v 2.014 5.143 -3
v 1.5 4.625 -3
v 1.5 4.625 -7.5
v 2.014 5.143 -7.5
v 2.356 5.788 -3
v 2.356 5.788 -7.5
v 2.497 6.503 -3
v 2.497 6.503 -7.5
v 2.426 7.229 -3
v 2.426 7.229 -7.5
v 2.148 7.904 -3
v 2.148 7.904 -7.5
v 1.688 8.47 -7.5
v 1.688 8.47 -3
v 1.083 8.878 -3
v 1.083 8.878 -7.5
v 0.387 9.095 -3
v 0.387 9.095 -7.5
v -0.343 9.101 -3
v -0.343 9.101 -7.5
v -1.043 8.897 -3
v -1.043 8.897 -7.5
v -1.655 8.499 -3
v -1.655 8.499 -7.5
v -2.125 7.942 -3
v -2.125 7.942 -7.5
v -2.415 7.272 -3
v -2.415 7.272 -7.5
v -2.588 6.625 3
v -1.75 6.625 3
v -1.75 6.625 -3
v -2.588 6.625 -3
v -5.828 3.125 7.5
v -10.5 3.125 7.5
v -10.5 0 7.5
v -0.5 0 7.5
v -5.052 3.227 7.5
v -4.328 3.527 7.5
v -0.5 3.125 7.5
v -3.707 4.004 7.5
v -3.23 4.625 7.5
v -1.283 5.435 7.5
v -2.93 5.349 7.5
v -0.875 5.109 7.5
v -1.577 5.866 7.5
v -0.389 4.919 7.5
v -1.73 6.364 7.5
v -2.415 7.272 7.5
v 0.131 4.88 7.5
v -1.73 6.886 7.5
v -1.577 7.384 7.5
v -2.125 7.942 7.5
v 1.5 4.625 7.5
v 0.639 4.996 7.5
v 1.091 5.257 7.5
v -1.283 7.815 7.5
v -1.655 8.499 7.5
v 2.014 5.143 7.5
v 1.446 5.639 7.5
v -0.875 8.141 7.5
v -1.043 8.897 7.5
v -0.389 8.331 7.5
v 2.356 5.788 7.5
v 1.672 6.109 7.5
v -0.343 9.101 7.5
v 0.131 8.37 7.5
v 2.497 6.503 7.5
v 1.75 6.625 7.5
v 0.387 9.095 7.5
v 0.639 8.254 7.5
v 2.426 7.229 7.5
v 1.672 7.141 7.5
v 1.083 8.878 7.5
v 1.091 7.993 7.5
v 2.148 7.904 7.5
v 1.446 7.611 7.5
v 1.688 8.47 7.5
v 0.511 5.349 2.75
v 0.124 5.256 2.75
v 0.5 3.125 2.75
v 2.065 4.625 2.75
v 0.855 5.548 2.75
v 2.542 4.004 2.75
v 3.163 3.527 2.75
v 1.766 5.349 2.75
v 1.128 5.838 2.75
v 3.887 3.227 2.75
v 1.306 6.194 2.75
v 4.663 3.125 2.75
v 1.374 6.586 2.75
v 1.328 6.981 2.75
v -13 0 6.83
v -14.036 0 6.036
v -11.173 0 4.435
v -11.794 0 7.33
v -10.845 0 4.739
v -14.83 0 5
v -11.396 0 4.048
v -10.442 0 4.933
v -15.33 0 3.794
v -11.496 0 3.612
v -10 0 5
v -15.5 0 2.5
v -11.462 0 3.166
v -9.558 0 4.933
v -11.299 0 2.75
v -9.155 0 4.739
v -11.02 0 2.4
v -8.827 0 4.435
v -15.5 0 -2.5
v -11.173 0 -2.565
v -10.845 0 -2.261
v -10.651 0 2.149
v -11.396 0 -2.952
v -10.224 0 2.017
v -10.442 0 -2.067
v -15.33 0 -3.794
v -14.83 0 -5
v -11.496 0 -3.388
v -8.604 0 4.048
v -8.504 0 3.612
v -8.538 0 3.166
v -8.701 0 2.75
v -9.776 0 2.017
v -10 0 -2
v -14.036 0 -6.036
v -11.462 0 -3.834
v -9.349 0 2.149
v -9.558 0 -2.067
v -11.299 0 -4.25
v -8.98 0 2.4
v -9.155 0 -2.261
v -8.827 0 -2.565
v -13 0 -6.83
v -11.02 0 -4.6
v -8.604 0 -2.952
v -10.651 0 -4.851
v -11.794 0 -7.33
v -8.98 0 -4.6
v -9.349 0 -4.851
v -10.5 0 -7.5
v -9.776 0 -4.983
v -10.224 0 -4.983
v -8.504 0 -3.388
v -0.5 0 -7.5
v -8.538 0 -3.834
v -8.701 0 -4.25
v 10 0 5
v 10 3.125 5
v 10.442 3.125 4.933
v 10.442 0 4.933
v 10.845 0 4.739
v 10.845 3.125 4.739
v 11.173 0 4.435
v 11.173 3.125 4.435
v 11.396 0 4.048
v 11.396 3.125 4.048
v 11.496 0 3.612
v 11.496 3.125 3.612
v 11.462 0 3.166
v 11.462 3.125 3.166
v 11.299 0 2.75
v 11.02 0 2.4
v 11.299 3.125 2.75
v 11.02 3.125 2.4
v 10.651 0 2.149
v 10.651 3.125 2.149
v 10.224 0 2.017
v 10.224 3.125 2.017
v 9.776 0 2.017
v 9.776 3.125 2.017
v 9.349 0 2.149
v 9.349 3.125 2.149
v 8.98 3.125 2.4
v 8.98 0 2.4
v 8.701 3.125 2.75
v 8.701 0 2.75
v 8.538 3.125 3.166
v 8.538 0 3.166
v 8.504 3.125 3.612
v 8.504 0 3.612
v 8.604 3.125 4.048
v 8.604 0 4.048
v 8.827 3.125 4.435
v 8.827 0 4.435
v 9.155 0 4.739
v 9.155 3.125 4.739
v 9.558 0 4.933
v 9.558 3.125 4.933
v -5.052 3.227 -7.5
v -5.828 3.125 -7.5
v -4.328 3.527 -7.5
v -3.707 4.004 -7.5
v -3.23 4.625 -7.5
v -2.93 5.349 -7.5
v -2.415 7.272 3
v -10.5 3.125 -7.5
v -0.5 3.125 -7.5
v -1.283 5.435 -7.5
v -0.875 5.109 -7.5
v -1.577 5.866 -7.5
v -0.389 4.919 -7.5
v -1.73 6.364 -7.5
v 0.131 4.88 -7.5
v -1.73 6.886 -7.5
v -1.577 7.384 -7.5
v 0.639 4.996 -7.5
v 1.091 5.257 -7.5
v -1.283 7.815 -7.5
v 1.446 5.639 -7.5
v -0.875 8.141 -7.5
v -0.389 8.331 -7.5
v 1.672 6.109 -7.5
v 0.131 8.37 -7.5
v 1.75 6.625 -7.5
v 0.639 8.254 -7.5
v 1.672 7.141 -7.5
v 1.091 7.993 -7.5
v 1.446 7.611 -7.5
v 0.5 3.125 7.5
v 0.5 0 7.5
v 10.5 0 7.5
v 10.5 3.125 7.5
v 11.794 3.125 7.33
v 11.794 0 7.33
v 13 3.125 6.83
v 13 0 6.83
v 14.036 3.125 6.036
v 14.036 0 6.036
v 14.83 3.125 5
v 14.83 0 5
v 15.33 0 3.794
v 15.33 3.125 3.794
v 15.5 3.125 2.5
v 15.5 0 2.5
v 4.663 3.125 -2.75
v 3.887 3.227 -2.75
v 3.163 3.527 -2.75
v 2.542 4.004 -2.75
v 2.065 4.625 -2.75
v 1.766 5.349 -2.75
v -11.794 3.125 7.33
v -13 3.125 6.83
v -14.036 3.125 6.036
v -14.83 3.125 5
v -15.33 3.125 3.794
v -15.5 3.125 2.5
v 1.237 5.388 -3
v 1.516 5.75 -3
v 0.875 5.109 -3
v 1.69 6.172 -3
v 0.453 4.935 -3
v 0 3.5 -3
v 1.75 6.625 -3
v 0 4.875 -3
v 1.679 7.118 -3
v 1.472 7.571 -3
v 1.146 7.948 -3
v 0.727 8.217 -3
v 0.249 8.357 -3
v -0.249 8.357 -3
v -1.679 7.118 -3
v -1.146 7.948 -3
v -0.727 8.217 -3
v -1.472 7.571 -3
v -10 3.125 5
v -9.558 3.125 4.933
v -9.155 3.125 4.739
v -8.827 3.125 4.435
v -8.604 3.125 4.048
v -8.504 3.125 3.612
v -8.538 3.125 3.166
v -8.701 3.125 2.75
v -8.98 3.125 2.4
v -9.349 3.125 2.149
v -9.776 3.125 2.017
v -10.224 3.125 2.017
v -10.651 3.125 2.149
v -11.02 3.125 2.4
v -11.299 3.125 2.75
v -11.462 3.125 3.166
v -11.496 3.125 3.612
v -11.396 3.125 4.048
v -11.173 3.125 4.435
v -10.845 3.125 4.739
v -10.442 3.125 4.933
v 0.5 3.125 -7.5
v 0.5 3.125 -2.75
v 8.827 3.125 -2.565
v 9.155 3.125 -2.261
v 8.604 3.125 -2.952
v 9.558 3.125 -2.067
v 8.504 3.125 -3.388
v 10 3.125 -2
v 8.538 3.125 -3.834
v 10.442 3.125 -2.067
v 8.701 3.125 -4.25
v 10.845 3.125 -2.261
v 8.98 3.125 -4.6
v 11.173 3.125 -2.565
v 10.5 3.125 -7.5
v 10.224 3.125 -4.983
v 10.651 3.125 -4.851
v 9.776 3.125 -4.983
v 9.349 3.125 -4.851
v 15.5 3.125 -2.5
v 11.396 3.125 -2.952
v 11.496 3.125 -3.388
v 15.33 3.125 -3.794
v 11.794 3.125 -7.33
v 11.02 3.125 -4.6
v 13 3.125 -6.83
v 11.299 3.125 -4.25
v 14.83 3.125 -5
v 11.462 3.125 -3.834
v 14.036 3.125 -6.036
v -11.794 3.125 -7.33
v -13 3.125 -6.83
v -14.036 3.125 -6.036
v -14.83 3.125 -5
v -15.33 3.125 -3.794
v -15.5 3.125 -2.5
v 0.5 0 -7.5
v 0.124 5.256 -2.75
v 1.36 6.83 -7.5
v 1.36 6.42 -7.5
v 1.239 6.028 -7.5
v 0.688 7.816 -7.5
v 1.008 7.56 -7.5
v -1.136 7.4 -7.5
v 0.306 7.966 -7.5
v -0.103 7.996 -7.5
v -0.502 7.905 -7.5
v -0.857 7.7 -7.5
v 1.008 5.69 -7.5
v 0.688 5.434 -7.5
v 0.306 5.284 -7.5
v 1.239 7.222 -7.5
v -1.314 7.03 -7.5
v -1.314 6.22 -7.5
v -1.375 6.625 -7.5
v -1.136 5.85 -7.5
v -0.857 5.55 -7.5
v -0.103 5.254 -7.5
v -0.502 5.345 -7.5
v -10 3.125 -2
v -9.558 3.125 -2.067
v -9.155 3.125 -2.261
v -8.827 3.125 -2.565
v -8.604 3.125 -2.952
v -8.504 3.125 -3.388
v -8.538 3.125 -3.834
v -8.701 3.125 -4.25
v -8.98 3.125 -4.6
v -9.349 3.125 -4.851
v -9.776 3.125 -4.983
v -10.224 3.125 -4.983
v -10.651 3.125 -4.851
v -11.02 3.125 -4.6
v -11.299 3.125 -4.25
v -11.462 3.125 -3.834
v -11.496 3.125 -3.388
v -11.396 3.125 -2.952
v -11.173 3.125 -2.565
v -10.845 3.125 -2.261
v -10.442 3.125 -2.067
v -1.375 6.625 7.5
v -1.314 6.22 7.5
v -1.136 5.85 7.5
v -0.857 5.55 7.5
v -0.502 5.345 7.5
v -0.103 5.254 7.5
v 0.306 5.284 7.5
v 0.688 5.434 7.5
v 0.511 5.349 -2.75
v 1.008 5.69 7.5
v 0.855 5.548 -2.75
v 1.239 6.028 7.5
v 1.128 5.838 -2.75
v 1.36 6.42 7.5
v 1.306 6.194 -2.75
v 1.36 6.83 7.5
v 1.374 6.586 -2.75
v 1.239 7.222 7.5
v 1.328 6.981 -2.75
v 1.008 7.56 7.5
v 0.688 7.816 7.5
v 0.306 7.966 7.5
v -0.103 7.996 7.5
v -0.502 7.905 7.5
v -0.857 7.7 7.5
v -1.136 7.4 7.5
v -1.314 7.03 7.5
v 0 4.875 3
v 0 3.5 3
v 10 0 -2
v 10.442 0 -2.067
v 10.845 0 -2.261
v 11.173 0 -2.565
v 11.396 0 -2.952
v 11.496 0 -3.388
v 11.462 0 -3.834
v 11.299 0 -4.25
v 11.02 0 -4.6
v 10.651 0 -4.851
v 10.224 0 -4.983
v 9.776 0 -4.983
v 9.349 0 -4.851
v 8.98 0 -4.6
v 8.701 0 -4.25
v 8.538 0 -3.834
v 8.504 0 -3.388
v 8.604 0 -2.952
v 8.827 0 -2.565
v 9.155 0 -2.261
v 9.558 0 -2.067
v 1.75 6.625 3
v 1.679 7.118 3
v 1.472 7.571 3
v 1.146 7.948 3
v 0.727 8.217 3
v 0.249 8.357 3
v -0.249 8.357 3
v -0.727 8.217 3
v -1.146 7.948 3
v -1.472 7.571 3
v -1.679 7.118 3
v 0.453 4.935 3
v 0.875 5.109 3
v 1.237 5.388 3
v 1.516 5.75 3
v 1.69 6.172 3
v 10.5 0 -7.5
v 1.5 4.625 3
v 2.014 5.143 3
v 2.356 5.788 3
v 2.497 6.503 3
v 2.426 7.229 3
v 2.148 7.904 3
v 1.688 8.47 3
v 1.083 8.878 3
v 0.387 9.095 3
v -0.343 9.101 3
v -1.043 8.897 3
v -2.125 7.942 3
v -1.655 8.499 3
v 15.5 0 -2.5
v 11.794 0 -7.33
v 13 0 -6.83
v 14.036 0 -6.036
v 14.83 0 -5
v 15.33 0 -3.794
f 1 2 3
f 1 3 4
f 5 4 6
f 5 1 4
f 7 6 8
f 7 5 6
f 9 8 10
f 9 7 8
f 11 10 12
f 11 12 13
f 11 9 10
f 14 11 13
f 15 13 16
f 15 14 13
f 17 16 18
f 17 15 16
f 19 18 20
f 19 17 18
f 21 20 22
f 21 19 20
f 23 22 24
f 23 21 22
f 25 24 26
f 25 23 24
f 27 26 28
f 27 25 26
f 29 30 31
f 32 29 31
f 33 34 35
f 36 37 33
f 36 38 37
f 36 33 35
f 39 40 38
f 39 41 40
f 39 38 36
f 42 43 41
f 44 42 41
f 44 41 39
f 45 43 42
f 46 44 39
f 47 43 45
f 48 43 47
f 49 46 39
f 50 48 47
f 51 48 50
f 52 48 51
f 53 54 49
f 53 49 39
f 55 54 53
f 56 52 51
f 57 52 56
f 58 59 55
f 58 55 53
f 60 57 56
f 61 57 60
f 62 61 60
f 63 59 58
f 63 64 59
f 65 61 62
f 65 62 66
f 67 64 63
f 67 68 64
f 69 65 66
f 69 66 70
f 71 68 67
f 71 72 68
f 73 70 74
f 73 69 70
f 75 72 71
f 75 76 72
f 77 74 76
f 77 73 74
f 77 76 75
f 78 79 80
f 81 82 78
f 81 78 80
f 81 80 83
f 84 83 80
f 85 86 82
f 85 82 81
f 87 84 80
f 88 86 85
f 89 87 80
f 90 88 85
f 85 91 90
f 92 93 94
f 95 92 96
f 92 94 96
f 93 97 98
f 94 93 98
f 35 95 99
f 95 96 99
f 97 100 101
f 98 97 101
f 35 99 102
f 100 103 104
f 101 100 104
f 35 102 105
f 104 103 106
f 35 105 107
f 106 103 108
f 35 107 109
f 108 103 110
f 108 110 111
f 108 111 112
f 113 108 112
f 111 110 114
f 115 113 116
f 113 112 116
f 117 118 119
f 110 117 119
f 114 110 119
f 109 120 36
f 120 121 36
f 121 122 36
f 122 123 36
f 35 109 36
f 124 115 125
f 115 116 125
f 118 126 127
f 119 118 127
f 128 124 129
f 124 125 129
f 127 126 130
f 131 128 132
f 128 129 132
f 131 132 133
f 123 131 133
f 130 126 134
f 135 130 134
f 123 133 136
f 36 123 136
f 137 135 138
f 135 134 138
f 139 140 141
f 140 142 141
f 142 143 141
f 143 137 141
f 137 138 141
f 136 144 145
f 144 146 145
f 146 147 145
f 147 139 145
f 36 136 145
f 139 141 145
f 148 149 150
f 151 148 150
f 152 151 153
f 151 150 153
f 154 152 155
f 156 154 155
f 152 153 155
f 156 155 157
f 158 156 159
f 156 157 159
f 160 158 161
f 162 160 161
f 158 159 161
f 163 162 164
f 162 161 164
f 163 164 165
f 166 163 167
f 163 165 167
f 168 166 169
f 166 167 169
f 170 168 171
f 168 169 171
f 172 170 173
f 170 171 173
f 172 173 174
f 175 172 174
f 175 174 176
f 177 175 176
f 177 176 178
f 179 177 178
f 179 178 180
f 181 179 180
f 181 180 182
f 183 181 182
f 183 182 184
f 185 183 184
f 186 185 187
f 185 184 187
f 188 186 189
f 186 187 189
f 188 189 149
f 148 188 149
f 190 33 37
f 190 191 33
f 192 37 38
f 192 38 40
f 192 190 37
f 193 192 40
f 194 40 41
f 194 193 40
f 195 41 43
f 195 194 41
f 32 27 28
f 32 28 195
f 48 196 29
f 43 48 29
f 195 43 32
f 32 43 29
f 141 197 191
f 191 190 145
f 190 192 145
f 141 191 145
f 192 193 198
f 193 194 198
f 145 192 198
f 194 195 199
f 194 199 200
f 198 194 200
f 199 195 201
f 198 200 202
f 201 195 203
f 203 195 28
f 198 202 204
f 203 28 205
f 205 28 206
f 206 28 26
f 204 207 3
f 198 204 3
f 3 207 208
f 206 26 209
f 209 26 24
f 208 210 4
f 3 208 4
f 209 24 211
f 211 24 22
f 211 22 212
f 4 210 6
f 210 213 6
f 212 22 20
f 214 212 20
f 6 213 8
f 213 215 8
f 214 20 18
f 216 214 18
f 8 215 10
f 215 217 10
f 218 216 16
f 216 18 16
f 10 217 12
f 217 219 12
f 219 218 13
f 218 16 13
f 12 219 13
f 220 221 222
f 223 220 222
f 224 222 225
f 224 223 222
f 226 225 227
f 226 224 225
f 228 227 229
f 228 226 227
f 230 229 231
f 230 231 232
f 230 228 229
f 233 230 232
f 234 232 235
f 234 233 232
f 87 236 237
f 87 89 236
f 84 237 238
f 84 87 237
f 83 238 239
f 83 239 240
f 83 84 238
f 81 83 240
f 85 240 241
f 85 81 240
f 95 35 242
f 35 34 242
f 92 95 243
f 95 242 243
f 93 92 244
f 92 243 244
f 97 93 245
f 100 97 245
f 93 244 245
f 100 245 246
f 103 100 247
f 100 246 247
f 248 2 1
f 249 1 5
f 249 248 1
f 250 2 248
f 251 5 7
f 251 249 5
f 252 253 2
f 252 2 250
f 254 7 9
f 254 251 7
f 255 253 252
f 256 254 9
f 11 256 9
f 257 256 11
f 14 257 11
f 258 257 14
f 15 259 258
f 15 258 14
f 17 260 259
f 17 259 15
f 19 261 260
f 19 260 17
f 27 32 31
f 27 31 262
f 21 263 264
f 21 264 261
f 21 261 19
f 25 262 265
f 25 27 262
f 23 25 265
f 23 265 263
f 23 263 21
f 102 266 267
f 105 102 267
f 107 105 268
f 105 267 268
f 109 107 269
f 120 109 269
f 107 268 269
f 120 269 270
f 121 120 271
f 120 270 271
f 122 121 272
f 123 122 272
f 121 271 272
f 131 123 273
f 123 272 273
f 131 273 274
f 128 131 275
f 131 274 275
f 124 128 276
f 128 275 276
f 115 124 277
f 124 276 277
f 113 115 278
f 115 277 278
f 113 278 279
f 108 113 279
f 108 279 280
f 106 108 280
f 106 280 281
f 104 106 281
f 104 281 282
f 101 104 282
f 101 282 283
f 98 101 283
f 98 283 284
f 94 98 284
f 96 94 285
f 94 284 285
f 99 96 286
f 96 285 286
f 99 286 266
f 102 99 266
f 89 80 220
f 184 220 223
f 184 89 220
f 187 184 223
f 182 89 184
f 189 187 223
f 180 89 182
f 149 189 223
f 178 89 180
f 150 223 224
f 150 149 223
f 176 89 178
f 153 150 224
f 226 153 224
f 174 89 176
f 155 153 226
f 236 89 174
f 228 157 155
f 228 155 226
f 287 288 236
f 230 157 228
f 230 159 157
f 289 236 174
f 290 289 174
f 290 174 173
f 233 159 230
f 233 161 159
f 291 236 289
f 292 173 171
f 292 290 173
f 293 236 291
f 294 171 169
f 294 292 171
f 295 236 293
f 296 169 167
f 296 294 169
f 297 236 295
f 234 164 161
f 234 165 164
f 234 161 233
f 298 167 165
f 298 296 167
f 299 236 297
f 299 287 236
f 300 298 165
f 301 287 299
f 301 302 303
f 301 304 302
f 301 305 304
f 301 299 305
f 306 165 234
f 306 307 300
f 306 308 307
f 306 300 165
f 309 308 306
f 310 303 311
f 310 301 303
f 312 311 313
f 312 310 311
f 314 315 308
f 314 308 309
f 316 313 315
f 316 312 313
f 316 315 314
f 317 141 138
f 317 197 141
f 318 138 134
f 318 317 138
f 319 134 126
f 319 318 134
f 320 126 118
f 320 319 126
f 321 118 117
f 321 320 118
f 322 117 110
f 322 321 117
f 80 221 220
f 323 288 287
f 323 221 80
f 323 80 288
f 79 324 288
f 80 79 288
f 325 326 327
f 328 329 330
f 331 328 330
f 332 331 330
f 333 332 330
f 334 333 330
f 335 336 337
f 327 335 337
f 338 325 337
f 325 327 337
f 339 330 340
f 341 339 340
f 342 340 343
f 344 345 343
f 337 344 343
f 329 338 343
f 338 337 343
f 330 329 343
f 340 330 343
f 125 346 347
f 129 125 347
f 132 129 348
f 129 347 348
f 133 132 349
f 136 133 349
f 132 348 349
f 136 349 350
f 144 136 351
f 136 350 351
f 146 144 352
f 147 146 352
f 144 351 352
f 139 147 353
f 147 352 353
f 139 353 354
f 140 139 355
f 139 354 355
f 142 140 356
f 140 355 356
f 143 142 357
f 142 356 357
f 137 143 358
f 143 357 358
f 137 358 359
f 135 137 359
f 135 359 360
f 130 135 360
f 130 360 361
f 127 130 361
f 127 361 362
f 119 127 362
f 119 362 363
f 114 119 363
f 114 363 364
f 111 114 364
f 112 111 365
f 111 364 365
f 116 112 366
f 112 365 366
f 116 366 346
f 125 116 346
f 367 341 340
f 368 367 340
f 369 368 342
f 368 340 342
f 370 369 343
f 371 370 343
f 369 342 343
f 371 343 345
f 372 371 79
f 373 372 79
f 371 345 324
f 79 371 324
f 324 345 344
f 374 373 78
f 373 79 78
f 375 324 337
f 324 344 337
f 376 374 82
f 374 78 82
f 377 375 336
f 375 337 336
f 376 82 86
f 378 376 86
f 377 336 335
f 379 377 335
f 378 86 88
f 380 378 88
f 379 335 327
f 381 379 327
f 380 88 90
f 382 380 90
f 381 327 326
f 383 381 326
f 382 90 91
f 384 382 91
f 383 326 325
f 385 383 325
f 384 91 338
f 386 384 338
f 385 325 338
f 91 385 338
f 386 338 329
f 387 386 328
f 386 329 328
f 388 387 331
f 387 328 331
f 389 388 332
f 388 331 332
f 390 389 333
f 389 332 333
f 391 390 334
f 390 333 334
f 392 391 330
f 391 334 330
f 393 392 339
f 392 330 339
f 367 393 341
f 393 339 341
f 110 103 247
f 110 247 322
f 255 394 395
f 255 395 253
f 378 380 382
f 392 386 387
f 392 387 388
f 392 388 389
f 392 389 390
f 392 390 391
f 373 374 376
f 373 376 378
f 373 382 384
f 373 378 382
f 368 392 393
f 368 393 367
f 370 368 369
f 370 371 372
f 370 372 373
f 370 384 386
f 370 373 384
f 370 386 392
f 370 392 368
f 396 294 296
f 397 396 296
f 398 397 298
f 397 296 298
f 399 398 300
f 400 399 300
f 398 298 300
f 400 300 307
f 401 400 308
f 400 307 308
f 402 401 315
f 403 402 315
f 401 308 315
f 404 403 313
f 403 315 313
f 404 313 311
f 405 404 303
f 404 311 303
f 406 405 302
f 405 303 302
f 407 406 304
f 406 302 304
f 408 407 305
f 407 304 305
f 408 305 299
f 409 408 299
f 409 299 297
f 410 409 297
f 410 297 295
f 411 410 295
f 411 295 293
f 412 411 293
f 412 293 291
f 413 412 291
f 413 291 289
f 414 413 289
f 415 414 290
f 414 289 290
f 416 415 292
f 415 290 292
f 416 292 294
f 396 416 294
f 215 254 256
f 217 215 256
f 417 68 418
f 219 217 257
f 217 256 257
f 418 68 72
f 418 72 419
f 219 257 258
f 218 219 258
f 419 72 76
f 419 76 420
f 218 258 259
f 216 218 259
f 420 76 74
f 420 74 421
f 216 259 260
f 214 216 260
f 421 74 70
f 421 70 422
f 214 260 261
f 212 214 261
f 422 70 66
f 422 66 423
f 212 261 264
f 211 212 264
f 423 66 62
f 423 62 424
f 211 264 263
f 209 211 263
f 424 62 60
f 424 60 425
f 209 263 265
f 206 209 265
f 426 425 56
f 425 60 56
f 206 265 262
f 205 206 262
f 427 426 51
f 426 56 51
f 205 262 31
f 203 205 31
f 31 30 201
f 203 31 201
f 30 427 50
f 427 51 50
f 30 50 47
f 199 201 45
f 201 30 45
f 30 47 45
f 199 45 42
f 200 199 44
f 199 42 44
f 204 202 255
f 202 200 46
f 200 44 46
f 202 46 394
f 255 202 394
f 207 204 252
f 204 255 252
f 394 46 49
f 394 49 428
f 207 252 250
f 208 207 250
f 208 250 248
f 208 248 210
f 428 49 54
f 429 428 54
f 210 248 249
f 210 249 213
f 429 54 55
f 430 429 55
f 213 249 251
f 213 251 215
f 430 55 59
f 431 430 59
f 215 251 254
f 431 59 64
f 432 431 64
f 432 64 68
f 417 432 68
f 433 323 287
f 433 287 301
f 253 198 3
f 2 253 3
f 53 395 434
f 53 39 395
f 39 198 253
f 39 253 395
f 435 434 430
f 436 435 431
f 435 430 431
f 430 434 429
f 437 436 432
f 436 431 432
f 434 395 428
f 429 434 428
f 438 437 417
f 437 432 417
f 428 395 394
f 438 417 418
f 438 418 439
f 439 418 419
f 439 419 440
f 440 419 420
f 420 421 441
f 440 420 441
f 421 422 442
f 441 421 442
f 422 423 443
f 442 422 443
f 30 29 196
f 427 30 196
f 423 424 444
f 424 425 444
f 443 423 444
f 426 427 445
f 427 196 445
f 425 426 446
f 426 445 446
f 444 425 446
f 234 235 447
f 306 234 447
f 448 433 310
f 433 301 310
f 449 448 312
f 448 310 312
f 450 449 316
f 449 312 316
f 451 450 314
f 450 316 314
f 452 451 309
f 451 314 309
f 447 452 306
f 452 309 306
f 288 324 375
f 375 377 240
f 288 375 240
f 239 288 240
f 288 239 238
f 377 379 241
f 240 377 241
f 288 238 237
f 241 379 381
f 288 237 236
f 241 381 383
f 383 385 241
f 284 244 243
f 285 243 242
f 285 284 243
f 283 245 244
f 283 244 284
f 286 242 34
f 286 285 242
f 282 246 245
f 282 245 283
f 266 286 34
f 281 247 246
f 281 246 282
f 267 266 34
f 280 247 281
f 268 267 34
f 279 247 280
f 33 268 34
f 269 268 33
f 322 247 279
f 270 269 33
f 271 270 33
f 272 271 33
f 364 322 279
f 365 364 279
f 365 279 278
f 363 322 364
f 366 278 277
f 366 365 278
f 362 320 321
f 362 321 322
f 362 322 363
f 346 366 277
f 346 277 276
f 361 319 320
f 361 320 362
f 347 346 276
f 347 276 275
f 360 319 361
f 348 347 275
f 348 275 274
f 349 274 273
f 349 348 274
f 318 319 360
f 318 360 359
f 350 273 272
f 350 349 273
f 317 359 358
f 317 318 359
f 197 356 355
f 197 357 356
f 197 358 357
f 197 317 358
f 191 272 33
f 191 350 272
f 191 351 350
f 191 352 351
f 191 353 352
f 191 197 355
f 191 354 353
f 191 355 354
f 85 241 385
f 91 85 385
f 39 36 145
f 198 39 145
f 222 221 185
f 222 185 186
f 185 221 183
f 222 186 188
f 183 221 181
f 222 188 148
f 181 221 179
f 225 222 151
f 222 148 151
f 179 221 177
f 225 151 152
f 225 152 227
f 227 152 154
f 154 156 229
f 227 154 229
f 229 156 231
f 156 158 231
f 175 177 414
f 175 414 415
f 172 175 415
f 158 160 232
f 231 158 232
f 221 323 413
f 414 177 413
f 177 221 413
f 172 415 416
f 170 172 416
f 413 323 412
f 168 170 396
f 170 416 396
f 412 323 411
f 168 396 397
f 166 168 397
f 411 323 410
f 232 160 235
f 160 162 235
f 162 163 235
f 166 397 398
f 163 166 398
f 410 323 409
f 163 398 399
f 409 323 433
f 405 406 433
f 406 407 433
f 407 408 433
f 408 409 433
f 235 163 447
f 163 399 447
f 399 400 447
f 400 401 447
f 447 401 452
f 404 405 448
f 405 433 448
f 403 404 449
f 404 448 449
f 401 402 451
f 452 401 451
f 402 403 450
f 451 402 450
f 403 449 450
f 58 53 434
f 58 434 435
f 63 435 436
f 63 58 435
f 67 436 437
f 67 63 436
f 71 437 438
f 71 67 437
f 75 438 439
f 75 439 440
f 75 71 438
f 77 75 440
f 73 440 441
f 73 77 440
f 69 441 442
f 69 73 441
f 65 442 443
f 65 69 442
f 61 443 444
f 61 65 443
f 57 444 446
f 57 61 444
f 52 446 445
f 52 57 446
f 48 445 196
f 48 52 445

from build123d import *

# Parameters (mm, degrees)
SKETCH2_W                = 15
SKETCH2_H                = 15
BOSS_EXTRUDE1_DEPTH      = 3.125
BOSS_EXTRUDE1_2_DEPTH    = 3.125
SKETCH3_R                = 1.75
BOSS_EXTRUDE2_DEPTH      = 15
SKETCH4_W                = 6
SKETCH4_H                = 5.75
CUT_EXTRUDE1_DEPTH       = 2.5
CUT_EXTRUDE4_REACH       = 21.488
SKETCH9_W                = 6
SKETCH9_H                = 2.5
BOSS_EXTRUDE3_DEPTH      = 2.75
BOSS_EXTRUDE3_DEPTH_BACK = 2.75
BOSS_EXTRUDE4_START      = -7.5
SKETCH7_R                = 1.375
BOSS_EXTRUDE4_DEPTH      = 15
SKETCH8_R                = 1.5
CUT_EXTRUDE2_DEPTH       = 3.125
FILLET1_R                = 5
FILLET2_R                = 5
FILLET3_R                = 3
FILLET4_R                = 3


with BuildPart() as part:
    # Sketch2 → Boss-Extrude1 (new body)
    with BuildSketch(Plane(origin=(0, 0, 0), x_dir=(1, 0, 0), z_dir=(0, 1, 0))):
        with Locations((-8, 0)):
            Rectangle(SKETCH2_W, SKETCH2_H)
    extrude(amount=BOSS_EXTRUDE1_DEPTH)

    # Sketch3 → Boss-Extrude2 (add)
    with BuildSketch(Plane.XY.offset(7.5)):
        with BuildLine():
            Line((-0.5, 3.125), (1.5, 4.625))
            ThreePointArc((1.5, 4.625), (1.400334, 8.696005), (-2.414815, 7.272048))
            Line((-2.414815, 7.272048), (-3.526013, 3.125))
            Line((-3.526013, 3.125), (-0.5, 3.125))
        make_face()
        with Locations((0, 6.625)):
            Circle(SKETCH3_R, mode=Mode.SUBTRACT)
    extrude(amount=-BOSS_EXTRUDE2_DEPTH)

    # Sketch4 → Cut-Extrude1 (cut)
    with BuildSketch(Plane(origin=(0, 0, 0), x_dir=(0, 0, -1), z_dir=(1, 0, 0))):
        with Locations((0, 6.25)):
            Rectangle(SKETCH4_W, SKETCH4_H)
    extrude(amount=CUT_EXTRUDE1_DEPTH, mode=Mode.SUBTRACT)

    # Cut-Extrude4: up to this plane
    cut_extrude4_end = Plane(origin=(-2.414815, 7.272048, -16.003695), z_dir=(-0.9659258262890672, 0.25881904510252496, 0))
    # Sketch9 → Cut-Extrude4 (cut, up to the surface)
    with BuildSketch(Plane(origin=(0, 0, 0), x_dir=(0, 0, -1), z_dir=(1, 0, 0)), mode=Mode.PRIVATE) as cut_extrude4_sk1:
        with Locations((0, 7.875)):
            Rectangle(SKETCH9_W, SKETCH9_H)
    cut_extrude4_tool1 = split(extrude(cut_extrude4_sk1.sketch, amount=-CUT_EXTRUDE4_REACH, mode=Mode.PRIVATE), bisect_by=cut_extrude4_end, keep=Keep.BOTH, mode=Mode.PRIVATE)
    add(cut_extrude4_tool1.solids().sort_by_distance((0, 7.875, 0))[0], mode=Mode.SUBTRACT)


with BuildPart() as body_2:
    # Sketch2 → Boss-Extrude1 2 (new body)
    with BuildSketch(Plane(origin=(0, 0, 0), x_dir=(1, 0, 0), z_dir=(0, 1, 0))):
        with Locations((8, 0)):
            Rectangle(SKETCH2_W, SKETCH2_H)
    extrude(amount=BOSS_EXTRUDE1_2_DEPTH)

    # Sketch5 → Boss-Extrude3 (add, two sides: drawn at the far end of the back side and taken through both)
    with BuildSketch(Plane.XY.offset(-BOSS_EXTRUDE3_DEPTH_BACK)):
        with BuildLine():
            Line((0.124312, 5.255631), (0.5, 3.125))
            Line((0.5, 3.125), (2.361327, 3.125))
            Line((2.361327, 3.125), (1.328148, 6.980876))
            ThreePointArc((1.328148, 6.980876), (-1.12762, 7.411827), (0.124312, 5.255631))
        make_face()
    extrude(amount=BOSS_EXTRUDE3_DEPTH + BOSS_EXTRUDE3_DEPTH_BACK)

    # Sketch7 → Boss-Extrude4 (add)
    with BuildSketch(Plane.XY.offset(BOSS_EXTRUDE4_START)):
        with Locations(Location((0, 6.625, 0), (0, 0, 180))):
            Circle(SKETCH7_R)
    extrude(amount=BOSS_EXTRUDE4_DEPTH)


with BuildPart() as cut_extrude2_tool:
    # Sketch8 → Cut-Extrude2 (new body)
    with BuildSketch(Plane(origin=(0, 3.125, 0), x_dir=(1, 0, 0), z_dir=(0, 1, 0))):
        with Locations(Location((-10, 3.5, 0), (0, 0, 270))):
            Circle(SKETCH8_R)
        with Locations(Location((-10, -3.5, 0), (0, 0, 270))):
            Circle(SKETCH8_R)
        with Locations(Location((10, -3.5, 0), (0, 0, 270))):
            Circle(SKETCH8_R)
        with Locations(Location((10, 3.5, 0), (0, 0, 270))):
            Circle(SKETCH8_R)
    extrude(amount=-CUT_EXTRUDE2_DEPTH)


with BuildPart() as part_1:
    add(part.part)

    # Cut-Extrude2: cut by cut_extrude2_tool
    add(cut_extrude2_tool.part, mode=Mode.SUBTRACT)

    # Fillet1
    fillet1_edges = [part_1.edges().sort_by_distance(p)[0] for p in [
        (-15.5, 1.5625, 7.5),
        (-15.5, 1.5625, -7.5),
    ]]
    fillet(fillet1_edges, radius=FILLET1_R)

    # Fillet3
    fillet3_edges = [part_1.edges().sort_by_distance(p)[0] for p in [
        (-3.526013, 3.125, 0),
    ]]
    fillet(fillet3_edges, radius=FILLET3_R)


with BuildPart() as body_2_1:
    add(body_2.part)

    # Cut-Extrude2: cut by cut_extrude2_tool
    add(cut_extrude2_tool.part, mode=Mode.SUBTRACT)

    # Fillet2
    fillet2_edges = [body_2_1.edges().sort_by_distance(p)[0] for p in [
        (15.5, 1.5625, 7.5),
        (15.5, 1.5625, -7.5),
    ]]
    fillet(fillet2_edges, radius=FILLET2_R)

    # Fillet4
    fillet4_edges = [body_2_1.edges().sort_by_distance(p)[0] for p in [
        (2.361327, 3.125, 0),
    ]]
    fillet(fillet4_edges, radius=FILLET4_R)


solid = Compound([part_1.part, body_2_1.part])
